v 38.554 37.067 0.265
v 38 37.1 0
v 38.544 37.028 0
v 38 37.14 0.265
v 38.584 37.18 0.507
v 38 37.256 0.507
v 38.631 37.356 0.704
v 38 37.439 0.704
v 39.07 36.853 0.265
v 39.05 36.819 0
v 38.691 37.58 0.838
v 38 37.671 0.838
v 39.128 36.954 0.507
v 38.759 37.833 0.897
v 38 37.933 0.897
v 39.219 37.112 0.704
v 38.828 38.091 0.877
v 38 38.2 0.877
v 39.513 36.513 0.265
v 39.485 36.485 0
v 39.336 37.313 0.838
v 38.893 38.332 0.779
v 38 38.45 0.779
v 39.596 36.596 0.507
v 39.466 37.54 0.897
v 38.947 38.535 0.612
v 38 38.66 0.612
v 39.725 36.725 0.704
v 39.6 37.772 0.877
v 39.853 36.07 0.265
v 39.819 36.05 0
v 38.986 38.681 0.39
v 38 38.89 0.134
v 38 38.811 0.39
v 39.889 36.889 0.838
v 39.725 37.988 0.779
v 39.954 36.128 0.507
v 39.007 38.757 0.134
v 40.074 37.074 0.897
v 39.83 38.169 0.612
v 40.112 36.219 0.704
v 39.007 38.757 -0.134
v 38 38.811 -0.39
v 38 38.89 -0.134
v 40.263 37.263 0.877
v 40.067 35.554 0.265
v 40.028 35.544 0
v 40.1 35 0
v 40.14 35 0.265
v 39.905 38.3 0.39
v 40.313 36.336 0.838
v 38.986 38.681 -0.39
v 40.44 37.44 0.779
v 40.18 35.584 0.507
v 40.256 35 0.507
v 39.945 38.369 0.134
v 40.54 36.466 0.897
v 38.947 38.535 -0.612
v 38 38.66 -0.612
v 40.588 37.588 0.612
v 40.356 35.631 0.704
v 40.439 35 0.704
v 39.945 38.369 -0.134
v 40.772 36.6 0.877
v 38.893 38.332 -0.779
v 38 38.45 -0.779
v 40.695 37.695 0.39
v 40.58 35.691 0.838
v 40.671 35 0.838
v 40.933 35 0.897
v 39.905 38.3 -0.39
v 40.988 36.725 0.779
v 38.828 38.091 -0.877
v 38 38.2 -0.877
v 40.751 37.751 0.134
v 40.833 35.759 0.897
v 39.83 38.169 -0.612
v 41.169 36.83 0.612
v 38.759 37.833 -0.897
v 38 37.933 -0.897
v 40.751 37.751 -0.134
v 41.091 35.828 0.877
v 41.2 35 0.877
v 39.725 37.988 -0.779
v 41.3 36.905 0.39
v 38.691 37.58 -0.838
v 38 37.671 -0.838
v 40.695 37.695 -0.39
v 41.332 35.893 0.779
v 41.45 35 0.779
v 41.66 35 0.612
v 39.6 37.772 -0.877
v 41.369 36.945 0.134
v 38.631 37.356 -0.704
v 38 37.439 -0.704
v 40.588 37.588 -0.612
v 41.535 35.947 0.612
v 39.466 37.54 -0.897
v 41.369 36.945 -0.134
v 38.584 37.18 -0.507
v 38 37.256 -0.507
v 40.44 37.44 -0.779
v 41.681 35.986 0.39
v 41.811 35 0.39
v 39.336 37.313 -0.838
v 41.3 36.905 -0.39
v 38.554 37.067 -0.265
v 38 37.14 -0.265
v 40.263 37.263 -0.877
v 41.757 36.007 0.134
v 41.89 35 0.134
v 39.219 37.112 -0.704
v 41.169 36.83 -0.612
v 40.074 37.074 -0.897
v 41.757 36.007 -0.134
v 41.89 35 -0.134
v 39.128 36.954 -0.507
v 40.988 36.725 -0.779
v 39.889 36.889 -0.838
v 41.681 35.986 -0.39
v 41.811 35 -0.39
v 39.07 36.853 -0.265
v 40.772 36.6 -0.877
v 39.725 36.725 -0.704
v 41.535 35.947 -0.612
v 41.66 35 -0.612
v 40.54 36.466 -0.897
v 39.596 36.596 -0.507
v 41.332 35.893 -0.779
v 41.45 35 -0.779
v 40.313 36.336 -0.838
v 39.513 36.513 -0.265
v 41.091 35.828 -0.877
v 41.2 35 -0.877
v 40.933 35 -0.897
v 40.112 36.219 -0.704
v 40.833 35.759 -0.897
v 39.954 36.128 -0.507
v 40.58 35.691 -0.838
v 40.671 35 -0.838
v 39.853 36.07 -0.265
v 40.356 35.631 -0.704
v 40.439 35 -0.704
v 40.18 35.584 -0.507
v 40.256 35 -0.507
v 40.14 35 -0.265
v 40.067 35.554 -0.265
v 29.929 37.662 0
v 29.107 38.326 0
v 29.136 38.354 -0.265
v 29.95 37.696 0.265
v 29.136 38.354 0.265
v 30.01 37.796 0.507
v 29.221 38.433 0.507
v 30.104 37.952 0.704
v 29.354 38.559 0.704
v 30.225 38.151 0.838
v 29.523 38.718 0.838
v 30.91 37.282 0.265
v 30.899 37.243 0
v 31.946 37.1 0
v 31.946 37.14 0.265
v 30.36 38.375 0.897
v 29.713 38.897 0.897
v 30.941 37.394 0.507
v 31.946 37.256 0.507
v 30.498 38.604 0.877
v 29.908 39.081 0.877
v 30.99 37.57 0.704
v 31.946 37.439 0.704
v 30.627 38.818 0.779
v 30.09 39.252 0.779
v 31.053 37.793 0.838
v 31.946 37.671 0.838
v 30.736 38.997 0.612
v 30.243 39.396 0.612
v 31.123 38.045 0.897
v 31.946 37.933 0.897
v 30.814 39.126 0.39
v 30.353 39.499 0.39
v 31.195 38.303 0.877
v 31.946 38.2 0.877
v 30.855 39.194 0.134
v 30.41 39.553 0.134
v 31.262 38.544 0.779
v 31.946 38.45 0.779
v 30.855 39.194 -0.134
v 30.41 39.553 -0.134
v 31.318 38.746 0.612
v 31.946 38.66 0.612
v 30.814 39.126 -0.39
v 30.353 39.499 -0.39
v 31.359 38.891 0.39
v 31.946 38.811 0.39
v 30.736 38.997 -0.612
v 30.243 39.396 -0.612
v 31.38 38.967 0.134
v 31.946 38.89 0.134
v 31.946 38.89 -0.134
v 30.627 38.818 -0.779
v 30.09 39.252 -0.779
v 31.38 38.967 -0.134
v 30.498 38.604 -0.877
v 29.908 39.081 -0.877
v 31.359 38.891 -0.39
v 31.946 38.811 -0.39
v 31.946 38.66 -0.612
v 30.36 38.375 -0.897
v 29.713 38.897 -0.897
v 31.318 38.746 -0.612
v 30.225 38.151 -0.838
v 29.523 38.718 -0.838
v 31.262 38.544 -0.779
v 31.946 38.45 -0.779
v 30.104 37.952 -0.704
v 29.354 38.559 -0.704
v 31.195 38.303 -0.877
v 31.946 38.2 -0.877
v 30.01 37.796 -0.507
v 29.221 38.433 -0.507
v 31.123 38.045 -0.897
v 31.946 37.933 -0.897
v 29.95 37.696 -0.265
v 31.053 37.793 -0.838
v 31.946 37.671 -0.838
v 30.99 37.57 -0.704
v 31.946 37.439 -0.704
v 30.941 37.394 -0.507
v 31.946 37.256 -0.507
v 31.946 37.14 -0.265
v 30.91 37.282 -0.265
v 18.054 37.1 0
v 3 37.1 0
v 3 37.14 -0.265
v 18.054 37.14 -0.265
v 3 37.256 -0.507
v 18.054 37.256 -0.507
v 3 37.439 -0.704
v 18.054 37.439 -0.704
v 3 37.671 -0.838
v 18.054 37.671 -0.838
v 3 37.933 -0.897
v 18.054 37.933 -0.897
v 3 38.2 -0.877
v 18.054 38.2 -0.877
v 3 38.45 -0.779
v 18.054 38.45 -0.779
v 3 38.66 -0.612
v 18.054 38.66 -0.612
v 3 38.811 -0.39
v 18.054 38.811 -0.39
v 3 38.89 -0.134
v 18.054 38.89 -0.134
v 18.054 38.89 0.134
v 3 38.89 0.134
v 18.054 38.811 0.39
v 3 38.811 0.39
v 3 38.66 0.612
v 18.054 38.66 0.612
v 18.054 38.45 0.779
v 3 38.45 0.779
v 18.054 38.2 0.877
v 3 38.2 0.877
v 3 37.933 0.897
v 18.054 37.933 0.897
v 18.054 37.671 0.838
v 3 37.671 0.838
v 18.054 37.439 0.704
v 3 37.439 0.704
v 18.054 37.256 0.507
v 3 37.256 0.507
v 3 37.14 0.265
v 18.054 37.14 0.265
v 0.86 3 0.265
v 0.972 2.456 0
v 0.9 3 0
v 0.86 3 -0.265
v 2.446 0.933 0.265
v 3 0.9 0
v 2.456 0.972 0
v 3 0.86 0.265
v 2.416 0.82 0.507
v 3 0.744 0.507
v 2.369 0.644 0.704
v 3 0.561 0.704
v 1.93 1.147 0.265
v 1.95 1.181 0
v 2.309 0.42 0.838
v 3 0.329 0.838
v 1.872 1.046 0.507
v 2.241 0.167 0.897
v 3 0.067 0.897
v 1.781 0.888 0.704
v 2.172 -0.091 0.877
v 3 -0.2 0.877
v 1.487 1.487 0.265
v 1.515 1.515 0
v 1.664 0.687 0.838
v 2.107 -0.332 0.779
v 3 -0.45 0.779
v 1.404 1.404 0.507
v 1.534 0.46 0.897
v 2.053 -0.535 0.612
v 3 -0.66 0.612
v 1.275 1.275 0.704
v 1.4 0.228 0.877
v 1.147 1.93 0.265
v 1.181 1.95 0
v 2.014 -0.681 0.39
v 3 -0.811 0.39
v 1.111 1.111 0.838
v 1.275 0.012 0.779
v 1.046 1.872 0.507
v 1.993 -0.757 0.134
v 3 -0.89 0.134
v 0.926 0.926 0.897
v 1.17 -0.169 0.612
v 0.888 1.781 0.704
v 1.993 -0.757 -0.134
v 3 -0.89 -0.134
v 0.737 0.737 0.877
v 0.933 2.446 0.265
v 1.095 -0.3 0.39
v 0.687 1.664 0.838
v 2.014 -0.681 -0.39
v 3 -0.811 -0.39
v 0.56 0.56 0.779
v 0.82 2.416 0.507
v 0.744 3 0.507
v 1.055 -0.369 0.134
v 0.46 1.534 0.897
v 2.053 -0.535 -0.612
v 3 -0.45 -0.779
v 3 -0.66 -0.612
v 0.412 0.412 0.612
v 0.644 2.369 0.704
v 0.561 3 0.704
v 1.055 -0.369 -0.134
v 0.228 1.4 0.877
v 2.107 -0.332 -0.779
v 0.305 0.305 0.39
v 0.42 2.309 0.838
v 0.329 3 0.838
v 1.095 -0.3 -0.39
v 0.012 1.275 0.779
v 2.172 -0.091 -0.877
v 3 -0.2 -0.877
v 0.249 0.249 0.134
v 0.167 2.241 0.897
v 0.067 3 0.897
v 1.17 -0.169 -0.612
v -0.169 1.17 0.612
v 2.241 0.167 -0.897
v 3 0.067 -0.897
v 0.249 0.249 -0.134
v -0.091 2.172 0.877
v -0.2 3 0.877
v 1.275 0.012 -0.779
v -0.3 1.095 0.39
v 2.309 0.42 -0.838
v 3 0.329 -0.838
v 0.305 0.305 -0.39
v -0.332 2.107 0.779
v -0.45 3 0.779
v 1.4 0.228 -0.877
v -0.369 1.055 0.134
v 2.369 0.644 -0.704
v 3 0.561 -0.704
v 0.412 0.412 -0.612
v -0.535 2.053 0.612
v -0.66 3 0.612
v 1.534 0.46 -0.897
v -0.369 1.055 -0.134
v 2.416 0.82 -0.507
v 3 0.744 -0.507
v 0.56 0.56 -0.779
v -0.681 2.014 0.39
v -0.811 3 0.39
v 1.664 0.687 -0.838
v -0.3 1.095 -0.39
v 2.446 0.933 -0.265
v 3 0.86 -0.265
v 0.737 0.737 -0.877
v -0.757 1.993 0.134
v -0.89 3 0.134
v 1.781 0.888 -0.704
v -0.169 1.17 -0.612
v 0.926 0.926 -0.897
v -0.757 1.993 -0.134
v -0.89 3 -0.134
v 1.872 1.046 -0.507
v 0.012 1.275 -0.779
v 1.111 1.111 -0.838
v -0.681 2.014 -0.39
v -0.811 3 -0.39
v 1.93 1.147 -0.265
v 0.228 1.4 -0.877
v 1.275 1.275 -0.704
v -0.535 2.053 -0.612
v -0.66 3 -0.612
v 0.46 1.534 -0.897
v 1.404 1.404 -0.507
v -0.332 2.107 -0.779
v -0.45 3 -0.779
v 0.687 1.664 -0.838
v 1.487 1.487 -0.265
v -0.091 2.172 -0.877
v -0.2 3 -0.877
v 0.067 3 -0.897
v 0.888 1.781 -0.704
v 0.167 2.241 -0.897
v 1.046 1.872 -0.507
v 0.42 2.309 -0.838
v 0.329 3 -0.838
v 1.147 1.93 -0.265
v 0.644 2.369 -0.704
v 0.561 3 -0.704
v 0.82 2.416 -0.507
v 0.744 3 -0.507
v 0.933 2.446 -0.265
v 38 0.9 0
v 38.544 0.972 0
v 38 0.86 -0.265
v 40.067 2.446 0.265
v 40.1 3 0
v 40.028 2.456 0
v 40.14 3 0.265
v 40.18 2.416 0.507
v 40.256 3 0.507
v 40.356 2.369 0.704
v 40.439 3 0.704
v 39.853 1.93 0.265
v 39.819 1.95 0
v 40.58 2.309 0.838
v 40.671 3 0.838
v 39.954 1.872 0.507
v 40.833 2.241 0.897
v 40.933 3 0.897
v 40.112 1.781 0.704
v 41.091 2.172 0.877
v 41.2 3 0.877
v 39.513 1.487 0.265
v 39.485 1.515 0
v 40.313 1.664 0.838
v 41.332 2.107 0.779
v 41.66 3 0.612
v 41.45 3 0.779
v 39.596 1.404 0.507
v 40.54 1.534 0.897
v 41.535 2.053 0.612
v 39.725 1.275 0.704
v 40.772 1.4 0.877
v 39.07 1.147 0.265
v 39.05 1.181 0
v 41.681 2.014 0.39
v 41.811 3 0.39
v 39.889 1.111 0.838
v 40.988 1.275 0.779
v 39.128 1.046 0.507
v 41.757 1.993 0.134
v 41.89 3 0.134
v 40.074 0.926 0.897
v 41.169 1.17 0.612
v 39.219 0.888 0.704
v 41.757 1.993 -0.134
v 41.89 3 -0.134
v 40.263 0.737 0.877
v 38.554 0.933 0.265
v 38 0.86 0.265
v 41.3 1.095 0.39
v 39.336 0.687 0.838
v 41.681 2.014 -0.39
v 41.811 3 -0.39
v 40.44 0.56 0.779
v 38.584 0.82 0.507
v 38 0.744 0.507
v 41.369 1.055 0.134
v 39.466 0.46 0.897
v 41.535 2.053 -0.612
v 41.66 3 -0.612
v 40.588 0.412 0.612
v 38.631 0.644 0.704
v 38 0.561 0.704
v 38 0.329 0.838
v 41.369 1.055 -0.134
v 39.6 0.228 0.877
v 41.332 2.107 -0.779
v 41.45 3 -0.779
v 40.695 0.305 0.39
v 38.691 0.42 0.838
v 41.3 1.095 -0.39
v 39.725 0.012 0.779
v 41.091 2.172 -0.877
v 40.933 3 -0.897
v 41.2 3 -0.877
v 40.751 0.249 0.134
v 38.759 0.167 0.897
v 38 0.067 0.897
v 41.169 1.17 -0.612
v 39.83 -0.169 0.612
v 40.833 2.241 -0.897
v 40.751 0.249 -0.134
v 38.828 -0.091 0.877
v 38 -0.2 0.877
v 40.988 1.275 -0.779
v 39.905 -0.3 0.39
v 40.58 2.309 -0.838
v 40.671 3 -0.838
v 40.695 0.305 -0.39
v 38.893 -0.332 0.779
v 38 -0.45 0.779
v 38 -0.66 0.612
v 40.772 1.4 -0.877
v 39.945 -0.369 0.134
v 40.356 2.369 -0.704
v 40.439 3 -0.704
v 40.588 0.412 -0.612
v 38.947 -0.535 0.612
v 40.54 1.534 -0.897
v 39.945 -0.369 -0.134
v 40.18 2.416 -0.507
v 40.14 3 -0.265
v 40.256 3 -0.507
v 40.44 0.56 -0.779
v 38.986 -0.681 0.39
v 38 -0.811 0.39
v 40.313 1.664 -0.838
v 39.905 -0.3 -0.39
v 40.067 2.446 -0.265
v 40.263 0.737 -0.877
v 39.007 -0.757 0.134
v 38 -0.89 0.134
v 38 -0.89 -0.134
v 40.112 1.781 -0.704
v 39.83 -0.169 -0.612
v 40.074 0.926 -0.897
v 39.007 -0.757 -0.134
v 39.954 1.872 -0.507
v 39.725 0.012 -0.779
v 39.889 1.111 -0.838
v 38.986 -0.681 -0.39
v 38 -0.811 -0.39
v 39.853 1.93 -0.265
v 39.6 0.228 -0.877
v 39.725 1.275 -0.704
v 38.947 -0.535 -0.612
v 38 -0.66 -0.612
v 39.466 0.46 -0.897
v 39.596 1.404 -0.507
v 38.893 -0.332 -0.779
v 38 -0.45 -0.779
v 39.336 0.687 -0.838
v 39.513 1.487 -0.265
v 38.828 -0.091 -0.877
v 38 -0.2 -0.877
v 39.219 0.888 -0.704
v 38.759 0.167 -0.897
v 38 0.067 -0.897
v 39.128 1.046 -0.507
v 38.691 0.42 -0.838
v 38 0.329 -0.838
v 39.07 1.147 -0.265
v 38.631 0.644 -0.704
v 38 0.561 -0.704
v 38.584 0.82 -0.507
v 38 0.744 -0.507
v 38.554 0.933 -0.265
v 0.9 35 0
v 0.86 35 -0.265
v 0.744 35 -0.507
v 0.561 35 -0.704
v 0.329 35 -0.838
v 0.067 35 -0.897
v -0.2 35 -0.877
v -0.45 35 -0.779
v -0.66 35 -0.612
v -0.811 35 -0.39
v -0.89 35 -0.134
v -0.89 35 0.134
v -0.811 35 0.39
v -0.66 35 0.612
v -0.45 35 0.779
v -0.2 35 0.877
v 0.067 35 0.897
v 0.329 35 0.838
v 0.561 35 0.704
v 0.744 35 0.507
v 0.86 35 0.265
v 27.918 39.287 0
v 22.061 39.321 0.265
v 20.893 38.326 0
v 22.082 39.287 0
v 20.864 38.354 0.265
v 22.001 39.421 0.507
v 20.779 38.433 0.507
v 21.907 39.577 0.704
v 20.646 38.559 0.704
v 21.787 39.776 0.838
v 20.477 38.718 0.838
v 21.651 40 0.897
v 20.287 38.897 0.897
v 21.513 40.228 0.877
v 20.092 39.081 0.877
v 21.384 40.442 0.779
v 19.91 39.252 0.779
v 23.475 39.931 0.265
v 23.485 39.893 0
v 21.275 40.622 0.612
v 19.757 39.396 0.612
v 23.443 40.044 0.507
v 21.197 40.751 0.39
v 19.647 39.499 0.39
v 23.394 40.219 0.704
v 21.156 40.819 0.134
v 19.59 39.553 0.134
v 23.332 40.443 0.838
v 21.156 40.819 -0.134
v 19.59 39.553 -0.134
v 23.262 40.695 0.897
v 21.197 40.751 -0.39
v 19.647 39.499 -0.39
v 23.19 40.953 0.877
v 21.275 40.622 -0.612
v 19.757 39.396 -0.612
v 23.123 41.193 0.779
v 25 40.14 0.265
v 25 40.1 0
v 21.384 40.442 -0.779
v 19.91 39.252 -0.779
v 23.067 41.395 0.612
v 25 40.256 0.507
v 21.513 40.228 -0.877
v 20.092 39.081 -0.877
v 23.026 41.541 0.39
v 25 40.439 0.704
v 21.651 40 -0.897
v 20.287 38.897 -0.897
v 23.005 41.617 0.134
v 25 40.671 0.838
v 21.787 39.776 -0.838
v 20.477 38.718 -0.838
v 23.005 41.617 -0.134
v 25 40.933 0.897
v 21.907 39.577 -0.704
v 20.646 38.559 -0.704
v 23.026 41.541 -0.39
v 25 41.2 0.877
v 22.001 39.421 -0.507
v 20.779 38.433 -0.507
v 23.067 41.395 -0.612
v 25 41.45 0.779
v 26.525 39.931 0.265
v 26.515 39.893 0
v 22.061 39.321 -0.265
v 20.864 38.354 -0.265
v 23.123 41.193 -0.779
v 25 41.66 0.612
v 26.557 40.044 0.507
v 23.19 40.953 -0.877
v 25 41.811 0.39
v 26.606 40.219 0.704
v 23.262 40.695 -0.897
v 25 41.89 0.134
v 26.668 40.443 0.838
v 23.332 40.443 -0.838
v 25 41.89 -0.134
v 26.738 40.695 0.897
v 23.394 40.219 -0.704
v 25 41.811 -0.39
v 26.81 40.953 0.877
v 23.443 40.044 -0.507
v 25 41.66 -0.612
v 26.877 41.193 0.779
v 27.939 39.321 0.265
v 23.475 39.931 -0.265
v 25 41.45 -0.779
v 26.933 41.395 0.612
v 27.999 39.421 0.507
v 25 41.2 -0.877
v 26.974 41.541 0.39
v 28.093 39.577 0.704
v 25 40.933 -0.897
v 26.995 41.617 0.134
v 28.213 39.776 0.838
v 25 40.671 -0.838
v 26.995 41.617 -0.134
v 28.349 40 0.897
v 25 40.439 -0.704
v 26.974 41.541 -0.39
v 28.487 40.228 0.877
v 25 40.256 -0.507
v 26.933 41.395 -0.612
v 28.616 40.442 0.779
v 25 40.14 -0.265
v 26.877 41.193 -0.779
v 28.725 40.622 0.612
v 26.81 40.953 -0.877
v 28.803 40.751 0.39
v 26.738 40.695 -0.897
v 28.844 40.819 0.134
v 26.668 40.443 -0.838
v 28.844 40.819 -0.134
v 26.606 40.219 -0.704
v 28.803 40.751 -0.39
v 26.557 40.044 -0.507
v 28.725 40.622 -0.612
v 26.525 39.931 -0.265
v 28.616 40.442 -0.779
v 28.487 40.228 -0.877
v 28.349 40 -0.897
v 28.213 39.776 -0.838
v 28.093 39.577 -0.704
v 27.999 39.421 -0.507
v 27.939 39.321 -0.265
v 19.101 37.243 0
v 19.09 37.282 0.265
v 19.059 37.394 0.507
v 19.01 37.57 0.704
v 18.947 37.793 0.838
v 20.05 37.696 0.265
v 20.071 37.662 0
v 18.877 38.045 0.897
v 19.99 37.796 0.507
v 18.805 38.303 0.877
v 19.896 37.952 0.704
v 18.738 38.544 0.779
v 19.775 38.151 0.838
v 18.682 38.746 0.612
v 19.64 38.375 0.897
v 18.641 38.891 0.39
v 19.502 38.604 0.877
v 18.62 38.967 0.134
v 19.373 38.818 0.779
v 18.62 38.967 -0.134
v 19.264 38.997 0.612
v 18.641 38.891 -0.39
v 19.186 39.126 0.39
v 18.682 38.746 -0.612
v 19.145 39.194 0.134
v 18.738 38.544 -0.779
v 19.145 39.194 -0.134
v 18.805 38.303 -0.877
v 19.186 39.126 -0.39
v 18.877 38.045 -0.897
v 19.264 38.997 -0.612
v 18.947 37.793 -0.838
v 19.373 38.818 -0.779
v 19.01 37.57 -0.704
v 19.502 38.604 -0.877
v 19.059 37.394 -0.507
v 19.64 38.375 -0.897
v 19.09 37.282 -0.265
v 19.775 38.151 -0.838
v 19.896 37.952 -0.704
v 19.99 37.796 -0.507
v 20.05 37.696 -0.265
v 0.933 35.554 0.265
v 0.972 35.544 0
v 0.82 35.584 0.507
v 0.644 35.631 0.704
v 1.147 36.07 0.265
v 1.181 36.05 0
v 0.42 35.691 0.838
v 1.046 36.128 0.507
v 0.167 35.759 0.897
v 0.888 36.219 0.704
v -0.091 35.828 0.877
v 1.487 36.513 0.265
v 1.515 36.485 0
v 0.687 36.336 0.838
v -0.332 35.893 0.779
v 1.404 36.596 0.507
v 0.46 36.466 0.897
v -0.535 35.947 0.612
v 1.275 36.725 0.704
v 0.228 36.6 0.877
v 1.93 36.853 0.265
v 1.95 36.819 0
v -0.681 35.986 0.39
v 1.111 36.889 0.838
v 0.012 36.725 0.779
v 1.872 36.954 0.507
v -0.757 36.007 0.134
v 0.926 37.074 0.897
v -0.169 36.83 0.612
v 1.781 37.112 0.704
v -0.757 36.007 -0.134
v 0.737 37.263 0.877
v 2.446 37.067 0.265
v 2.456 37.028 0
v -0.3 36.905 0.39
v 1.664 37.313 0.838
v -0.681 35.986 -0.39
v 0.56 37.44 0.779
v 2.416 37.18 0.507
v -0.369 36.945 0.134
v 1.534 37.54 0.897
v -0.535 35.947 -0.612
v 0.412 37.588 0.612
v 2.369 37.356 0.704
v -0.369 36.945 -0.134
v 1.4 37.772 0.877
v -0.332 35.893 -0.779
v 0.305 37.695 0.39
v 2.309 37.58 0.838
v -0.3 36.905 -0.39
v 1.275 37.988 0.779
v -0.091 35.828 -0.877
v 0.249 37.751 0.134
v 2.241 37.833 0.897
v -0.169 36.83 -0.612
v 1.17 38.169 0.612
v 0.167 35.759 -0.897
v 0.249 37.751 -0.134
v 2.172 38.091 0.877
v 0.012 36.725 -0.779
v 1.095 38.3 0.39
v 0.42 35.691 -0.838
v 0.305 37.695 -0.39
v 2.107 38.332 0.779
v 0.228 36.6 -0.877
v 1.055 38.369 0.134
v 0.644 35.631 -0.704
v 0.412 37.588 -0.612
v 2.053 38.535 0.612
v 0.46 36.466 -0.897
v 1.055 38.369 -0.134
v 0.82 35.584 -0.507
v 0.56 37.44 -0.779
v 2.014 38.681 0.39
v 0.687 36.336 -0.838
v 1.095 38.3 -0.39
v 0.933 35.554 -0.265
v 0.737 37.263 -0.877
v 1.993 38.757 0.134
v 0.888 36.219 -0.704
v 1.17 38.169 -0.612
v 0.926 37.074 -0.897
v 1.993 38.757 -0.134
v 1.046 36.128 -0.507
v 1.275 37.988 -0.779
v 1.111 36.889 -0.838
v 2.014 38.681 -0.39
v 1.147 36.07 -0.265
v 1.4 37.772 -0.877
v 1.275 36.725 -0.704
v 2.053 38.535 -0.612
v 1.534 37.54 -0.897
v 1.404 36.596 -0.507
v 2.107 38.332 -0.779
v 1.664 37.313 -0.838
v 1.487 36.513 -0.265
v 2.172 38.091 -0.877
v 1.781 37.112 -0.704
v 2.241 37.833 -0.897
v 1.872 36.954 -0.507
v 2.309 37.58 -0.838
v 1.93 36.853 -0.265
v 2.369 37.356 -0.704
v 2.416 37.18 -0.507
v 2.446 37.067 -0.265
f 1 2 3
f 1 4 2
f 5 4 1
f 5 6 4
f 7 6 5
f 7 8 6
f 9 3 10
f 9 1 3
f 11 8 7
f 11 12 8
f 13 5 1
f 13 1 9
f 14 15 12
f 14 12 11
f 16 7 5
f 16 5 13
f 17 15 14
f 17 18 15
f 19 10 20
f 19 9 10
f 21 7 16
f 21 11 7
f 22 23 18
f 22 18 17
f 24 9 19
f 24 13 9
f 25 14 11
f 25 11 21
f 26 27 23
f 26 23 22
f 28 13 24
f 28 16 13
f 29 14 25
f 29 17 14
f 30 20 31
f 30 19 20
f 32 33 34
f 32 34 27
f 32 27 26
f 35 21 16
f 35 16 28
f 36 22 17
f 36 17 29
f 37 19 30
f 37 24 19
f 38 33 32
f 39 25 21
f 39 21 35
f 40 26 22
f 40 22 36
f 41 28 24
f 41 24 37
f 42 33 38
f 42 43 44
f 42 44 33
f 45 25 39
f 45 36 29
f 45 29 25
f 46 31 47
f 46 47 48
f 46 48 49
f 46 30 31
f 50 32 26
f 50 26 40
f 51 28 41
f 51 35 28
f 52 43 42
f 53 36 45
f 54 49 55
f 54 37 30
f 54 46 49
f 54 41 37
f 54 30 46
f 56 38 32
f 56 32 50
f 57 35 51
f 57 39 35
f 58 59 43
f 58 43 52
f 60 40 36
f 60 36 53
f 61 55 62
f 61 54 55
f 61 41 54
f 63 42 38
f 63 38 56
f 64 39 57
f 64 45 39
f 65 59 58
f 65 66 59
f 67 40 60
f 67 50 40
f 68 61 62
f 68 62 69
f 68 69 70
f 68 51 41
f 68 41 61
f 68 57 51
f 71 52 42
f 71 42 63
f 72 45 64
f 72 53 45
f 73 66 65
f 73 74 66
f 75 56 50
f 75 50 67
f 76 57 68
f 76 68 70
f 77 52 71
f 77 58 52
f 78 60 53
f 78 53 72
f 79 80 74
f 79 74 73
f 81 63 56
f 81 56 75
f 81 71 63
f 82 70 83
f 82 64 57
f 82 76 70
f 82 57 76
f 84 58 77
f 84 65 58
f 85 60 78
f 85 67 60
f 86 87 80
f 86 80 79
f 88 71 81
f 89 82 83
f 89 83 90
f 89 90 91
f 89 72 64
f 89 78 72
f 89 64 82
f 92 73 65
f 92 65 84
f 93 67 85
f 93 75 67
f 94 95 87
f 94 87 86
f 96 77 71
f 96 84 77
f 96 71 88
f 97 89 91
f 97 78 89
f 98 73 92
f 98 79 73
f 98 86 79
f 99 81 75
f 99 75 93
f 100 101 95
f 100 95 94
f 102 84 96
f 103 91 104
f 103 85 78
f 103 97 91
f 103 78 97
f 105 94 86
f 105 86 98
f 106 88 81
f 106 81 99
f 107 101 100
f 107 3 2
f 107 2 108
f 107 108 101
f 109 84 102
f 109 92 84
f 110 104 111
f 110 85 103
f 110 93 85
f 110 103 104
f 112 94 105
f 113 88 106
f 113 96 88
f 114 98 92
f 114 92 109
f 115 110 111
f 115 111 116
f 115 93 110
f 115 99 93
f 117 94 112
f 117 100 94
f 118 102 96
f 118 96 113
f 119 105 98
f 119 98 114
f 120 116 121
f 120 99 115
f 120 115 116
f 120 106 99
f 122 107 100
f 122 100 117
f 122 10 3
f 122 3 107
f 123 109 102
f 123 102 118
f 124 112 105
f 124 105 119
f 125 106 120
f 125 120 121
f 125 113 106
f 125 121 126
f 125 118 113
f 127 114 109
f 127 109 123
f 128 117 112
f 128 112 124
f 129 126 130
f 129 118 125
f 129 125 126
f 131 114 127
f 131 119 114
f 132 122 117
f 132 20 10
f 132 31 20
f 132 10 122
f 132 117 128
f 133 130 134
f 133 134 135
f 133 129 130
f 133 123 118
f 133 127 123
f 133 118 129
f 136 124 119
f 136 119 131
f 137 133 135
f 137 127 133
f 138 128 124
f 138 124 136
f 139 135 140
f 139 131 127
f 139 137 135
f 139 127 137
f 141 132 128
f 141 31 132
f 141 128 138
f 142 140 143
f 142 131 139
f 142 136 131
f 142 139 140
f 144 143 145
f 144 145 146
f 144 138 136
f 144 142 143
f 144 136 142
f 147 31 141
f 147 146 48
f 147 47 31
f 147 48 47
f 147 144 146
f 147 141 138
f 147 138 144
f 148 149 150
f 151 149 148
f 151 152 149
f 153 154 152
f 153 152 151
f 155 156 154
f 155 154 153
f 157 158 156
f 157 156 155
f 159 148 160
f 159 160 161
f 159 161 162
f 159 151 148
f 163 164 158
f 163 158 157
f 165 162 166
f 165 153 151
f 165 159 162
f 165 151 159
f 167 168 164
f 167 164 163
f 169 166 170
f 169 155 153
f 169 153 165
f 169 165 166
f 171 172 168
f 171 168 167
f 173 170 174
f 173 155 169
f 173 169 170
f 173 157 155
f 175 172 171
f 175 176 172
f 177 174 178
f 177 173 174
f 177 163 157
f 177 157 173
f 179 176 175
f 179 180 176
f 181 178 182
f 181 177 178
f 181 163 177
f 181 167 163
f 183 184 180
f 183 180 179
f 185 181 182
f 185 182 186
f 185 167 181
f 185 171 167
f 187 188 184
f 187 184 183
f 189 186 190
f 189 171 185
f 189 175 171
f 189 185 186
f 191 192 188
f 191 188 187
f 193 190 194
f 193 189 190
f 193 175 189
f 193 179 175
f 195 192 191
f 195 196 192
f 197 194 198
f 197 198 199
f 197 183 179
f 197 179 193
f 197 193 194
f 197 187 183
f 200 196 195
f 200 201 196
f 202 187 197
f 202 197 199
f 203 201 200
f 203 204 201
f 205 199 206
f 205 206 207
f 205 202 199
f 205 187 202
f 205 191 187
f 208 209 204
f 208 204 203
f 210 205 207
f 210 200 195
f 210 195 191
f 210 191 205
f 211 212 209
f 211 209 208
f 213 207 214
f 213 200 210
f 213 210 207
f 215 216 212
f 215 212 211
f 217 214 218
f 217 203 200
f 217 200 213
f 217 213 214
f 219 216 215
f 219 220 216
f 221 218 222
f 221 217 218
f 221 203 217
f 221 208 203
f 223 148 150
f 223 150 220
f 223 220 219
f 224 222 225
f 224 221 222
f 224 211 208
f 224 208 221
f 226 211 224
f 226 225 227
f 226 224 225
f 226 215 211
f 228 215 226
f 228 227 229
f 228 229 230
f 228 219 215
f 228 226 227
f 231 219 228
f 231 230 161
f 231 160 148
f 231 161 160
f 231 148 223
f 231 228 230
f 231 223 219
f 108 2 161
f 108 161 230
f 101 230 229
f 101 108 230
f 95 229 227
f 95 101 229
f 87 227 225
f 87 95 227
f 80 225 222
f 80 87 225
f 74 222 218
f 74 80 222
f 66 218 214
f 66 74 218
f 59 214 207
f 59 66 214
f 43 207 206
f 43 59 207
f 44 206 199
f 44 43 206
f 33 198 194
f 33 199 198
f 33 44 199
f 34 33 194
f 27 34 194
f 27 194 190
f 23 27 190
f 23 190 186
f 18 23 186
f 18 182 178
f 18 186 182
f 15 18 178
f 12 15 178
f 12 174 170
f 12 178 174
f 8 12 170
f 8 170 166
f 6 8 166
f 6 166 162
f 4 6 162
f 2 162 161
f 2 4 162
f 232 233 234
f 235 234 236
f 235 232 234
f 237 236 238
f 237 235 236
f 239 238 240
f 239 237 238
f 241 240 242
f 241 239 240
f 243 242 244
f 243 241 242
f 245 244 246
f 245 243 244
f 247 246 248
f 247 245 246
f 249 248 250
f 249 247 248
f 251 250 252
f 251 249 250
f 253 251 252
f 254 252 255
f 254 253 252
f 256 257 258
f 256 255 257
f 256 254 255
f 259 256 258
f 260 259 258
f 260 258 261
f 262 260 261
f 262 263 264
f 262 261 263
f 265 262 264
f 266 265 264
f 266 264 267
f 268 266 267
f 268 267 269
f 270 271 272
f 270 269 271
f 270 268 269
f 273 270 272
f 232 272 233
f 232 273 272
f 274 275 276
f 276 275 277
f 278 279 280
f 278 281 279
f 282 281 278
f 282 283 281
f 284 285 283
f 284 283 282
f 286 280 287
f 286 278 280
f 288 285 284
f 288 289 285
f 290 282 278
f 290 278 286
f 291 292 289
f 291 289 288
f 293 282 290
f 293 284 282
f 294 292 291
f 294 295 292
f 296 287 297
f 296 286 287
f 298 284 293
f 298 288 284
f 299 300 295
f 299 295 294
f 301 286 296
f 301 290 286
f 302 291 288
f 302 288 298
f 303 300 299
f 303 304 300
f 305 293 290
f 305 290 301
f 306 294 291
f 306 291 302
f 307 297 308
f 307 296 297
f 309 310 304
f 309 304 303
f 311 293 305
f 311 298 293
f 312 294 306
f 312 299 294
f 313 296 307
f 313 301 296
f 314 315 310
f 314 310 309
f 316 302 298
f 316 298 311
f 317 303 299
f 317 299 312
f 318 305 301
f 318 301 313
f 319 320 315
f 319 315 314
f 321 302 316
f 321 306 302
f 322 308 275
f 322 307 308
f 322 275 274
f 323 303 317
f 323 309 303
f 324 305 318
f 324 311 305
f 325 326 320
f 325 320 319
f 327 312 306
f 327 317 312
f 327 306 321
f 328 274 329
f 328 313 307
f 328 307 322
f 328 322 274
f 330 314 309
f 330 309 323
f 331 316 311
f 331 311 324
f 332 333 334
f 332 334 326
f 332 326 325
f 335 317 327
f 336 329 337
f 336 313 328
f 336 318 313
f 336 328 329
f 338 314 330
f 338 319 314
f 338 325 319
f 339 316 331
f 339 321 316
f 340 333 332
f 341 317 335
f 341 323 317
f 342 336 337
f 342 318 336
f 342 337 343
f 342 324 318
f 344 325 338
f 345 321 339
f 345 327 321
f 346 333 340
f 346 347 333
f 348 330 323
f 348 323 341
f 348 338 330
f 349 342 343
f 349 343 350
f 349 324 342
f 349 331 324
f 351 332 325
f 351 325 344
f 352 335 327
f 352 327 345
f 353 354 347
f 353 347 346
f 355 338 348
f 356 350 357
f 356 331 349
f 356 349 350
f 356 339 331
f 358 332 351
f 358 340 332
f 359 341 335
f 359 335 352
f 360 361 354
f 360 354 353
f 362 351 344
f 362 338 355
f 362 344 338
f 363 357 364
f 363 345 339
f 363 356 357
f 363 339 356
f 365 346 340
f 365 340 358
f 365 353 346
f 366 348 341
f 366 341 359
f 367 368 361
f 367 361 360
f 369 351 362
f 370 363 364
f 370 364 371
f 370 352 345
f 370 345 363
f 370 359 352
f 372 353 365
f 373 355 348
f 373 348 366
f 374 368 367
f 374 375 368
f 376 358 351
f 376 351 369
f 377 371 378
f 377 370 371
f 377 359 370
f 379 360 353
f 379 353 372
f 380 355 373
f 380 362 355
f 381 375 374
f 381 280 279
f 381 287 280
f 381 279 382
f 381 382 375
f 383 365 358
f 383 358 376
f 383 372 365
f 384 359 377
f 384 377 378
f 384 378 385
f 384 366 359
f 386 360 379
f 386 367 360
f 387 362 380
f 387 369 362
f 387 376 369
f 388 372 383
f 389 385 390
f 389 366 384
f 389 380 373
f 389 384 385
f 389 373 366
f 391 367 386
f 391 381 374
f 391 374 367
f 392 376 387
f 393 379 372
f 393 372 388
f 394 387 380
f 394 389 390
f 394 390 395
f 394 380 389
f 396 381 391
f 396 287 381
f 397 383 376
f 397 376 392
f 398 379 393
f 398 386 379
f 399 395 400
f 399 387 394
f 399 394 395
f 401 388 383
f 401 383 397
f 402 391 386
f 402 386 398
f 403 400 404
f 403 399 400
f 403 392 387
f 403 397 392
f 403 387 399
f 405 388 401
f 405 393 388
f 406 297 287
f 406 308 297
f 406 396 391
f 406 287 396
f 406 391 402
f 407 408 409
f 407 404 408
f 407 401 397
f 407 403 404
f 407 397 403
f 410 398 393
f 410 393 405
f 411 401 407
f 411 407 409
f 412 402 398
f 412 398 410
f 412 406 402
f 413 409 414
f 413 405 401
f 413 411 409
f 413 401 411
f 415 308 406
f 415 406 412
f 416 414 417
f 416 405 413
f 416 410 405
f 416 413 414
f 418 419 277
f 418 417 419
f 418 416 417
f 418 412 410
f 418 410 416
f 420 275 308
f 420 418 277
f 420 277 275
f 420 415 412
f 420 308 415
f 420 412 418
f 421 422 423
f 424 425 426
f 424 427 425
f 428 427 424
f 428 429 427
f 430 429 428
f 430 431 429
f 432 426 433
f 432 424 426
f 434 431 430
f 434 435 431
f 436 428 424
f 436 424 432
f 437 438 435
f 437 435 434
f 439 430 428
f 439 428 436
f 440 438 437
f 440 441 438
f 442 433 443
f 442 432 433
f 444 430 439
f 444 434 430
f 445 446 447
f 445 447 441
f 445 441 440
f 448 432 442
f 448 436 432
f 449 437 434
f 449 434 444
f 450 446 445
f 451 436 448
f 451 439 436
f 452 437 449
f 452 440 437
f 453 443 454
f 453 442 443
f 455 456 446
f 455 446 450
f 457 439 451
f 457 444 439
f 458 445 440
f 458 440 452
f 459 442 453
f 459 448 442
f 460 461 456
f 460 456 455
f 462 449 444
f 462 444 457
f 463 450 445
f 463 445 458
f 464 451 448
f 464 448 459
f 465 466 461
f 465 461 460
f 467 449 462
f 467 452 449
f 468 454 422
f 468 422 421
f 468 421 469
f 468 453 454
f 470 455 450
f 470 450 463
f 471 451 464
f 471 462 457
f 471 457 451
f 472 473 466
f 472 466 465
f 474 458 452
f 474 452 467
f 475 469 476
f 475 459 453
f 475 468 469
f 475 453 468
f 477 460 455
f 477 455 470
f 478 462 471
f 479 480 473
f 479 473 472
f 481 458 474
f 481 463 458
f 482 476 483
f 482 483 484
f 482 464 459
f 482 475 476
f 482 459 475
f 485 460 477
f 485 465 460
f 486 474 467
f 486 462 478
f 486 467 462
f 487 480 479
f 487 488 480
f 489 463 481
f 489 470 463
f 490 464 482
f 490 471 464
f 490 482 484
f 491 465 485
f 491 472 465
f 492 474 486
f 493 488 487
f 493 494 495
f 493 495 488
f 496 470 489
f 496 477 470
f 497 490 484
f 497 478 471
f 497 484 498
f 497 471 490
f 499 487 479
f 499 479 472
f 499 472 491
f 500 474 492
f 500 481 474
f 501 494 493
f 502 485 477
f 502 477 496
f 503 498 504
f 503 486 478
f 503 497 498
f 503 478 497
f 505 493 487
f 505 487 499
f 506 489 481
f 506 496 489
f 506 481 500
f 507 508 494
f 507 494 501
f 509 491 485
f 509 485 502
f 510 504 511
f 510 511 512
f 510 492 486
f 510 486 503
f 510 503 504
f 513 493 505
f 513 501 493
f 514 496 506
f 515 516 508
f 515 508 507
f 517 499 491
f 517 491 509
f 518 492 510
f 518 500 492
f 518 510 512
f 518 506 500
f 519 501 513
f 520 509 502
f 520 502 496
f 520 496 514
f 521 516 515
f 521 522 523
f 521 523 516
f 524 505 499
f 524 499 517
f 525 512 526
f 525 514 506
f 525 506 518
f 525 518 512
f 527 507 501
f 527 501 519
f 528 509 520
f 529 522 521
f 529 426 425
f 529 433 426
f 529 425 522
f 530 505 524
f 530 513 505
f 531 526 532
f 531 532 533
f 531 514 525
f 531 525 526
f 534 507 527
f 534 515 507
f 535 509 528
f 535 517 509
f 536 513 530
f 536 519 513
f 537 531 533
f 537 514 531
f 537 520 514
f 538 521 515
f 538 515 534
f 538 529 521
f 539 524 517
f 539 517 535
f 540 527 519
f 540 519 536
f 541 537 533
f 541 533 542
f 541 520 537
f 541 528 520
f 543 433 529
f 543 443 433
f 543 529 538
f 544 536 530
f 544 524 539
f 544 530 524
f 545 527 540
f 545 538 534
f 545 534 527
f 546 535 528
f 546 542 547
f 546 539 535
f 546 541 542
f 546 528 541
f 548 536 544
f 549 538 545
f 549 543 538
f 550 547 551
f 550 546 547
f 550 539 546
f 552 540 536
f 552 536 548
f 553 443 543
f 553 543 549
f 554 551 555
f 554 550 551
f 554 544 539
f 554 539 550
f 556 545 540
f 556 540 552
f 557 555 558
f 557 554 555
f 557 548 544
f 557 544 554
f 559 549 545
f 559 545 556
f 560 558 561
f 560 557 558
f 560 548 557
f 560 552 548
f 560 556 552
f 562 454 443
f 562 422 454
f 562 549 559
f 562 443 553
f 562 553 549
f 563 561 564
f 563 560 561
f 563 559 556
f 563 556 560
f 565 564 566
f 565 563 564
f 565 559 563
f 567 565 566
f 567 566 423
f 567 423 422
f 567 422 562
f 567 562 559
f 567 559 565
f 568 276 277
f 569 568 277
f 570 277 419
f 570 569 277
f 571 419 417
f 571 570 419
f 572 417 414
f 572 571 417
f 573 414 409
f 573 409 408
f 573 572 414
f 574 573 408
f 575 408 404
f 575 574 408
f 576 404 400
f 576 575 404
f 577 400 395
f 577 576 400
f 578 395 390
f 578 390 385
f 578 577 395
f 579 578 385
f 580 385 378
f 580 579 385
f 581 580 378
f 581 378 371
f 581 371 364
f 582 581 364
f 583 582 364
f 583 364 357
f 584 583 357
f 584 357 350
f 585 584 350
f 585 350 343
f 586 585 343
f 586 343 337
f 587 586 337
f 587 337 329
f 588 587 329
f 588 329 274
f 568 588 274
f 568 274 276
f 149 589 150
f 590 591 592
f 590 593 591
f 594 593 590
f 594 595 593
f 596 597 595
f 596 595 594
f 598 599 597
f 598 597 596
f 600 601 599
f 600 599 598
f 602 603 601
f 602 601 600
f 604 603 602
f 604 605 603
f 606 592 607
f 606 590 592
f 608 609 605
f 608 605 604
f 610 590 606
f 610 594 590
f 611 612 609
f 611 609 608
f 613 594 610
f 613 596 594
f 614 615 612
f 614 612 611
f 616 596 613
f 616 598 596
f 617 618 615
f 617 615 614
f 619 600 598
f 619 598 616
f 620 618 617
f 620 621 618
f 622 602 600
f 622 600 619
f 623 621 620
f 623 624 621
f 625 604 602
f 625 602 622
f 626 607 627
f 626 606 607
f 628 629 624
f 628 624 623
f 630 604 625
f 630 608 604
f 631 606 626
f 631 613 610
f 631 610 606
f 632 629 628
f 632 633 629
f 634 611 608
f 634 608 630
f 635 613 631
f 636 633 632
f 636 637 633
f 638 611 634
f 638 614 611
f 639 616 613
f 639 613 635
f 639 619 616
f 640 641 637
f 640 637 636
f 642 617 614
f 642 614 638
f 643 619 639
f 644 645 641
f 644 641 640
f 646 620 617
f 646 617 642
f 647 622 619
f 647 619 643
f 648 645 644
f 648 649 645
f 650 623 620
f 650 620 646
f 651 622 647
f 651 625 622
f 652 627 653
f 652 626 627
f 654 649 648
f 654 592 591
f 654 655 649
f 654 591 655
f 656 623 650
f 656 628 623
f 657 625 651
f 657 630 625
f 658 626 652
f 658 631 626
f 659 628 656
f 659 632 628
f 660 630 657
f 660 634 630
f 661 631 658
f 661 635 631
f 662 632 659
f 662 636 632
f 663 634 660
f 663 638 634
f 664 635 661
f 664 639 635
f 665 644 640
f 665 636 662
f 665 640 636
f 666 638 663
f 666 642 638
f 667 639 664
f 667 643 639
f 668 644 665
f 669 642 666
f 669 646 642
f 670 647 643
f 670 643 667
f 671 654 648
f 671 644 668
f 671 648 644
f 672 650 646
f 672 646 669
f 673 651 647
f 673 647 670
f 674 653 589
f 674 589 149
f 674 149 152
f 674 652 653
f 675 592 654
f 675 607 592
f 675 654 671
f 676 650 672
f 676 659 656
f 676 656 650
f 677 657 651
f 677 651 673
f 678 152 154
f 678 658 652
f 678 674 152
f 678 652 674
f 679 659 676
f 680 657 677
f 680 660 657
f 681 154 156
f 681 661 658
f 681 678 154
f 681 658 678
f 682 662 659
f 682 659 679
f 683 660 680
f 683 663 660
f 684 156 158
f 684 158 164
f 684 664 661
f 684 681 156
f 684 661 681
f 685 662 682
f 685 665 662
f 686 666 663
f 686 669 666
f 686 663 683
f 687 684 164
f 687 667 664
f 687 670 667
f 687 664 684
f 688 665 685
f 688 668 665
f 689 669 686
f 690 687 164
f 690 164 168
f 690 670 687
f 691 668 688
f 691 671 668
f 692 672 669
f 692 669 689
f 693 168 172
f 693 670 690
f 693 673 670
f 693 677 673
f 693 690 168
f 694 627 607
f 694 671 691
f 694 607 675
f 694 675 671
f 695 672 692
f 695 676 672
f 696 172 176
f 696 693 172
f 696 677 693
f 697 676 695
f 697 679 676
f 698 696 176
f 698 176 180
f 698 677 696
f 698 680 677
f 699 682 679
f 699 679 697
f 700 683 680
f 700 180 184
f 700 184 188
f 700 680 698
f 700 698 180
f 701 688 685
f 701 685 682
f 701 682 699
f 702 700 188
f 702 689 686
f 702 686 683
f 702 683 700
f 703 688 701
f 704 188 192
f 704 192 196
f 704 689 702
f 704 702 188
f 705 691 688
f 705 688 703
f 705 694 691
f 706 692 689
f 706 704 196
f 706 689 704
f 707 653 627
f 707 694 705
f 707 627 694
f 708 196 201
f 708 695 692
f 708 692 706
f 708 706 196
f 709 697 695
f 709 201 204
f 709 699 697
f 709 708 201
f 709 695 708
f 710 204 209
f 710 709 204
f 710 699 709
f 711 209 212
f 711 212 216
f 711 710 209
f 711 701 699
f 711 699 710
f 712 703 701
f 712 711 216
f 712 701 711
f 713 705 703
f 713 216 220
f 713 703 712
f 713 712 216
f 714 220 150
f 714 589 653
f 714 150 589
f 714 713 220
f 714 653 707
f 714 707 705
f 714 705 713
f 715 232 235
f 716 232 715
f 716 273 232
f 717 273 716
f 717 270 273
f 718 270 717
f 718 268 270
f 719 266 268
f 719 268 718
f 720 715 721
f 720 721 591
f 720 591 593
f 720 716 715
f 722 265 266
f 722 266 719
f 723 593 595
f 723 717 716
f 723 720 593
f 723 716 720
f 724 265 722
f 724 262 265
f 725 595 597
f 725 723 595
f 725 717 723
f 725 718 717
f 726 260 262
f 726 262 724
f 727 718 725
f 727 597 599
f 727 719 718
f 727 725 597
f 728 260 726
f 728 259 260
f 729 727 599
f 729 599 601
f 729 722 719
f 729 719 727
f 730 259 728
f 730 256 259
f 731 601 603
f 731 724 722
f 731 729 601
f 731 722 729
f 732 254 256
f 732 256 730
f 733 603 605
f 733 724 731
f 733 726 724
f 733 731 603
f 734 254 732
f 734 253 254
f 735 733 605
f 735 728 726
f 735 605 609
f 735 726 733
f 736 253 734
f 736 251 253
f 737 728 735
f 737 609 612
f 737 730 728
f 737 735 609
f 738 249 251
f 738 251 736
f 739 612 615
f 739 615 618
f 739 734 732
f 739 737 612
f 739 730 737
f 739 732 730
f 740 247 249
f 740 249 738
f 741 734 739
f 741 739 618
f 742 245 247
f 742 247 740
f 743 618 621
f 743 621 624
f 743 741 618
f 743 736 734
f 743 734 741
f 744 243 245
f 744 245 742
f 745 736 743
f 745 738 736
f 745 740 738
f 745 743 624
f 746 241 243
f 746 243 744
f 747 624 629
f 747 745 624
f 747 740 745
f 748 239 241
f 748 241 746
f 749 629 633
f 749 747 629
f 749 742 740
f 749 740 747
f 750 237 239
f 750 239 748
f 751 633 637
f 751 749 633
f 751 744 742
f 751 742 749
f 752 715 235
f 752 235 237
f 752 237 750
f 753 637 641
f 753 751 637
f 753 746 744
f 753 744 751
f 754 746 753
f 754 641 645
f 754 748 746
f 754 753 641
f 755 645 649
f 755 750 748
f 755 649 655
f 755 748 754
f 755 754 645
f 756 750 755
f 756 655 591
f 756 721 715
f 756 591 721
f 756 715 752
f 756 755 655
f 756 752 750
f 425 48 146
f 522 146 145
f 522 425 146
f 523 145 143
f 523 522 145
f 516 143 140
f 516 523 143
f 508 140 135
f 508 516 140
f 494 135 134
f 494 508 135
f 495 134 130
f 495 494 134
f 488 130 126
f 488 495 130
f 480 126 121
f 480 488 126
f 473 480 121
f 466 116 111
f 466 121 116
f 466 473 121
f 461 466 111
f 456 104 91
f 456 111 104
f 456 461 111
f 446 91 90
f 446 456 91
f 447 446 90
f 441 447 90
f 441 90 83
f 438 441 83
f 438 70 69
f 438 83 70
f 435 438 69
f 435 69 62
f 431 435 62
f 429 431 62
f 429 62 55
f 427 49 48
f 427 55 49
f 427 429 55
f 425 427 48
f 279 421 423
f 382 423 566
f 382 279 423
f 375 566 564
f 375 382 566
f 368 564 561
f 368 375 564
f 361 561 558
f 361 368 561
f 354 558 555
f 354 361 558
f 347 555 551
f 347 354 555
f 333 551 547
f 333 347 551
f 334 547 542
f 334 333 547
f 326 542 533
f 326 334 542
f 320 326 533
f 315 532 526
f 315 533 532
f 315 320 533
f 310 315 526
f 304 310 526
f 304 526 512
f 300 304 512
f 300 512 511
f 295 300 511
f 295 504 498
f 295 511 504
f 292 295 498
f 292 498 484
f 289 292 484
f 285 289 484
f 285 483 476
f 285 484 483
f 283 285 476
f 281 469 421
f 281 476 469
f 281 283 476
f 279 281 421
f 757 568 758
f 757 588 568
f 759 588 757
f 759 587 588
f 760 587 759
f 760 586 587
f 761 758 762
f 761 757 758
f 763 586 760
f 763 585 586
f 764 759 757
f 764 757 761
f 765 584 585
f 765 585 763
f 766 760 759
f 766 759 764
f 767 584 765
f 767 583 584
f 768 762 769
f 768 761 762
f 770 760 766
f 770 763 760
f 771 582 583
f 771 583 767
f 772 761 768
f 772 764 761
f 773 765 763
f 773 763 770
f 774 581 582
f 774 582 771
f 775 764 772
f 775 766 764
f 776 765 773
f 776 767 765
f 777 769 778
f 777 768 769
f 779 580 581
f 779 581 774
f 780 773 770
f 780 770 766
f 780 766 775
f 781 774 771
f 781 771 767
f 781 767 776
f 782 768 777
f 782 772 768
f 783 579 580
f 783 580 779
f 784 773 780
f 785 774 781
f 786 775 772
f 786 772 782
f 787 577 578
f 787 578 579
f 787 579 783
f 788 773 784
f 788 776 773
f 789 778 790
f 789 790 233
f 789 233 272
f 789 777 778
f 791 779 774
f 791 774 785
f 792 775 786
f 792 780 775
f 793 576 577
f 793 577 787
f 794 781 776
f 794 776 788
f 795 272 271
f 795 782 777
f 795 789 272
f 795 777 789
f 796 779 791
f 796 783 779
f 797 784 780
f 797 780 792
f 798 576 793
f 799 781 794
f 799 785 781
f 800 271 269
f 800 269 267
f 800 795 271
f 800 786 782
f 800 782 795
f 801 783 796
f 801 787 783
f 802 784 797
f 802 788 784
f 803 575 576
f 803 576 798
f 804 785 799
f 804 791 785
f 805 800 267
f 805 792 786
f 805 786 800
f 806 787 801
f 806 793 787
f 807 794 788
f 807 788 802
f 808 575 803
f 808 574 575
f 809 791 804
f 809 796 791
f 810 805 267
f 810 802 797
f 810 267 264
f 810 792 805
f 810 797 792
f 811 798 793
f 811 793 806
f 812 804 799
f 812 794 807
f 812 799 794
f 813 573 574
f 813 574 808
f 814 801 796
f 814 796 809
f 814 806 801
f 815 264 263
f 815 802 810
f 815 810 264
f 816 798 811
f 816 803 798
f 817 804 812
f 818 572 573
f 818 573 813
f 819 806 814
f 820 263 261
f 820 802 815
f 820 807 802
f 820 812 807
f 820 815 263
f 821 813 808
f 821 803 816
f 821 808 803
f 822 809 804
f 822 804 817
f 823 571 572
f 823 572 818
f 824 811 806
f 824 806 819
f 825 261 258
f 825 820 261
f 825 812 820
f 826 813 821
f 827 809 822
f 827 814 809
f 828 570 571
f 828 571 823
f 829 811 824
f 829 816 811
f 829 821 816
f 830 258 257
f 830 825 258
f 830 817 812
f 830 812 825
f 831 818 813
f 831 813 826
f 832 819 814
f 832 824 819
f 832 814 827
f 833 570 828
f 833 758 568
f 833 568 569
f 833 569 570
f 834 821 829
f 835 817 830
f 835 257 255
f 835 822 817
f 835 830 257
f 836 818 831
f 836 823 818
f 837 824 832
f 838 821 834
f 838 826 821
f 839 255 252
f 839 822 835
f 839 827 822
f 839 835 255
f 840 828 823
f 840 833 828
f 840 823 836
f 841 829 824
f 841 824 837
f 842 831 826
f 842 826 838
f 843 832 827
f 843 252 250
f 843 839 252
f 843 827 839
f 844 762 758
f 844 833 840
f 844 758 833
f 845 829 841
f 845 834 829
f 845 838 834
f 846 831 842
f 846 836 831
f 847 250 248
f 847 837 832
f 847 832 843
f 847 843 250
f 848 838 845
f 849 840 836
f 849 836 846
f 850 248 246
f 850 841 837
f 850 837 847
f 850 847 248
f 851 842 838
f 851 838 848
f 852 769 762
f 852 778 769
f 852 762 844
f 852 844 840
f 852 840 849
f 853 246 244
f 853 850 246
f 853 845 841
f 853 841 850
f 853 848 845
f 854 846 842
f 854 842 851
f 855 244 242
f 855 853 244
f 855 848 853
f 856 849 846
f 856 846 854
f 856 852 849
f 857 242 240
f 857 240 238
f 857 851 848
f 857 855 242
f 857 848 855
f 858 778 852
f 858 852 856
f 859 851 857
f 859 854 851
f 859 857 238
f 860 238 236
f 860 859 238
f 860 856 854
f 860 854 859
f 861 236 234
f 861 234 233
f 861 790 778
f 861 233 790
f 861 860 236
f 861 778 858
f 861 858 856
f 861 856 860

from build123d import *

# Parameters (mm, degrees)
SKETCH_3_R = 0.9


with BuildPart() as part:
    # По траектории2: sweep along a path in Эскиз1
    with BuildLine(Plane.XY) as sweep_2_path:
        Line((0, 3), (0, 35))
        ThreePointArc((0, 35), (0.878679656, 37.121320344), (3, 38))
        Line((3, 38), (18.053778005, 38))
        ThreePointArc((18.053778005, 38), (19.243251486, 38.245884382), (20.237742999, 38.943231441))
        ThreePointArc((20.237742999, 38.943231441), (25, 41), (29.762257001, 38.943231441))
        ThreePointArc((29.762257001, 38.943231441), (30.756748514, 38.245884382), (31.946221995, 38))
        Line((31.946221995, 38), (38, 38))
        ThreePointArc((38, 38), (40.121320344, 37.121320344), (41, 35))
        Line((41, 35), (41, 3))
        ThreePointArc((41, 3), (40.121320344, 0.878679656), (38, 0))
        Line((38, 0), (3, 0))
        ThreePointArc((3, 0), (0.878679656, 0.878679656), (0, 3))
    # Эскиз3 → По траектории2 (sweep)
    with BuildSketch(Plane(origin=(0, 3, 0), x_dir=(1, 0, 0), z_dir=(0, 1, 0))):
        Circle(SKETCH_3_R)
    sweep(path=sweep_2_path.line)


solid = part.part
